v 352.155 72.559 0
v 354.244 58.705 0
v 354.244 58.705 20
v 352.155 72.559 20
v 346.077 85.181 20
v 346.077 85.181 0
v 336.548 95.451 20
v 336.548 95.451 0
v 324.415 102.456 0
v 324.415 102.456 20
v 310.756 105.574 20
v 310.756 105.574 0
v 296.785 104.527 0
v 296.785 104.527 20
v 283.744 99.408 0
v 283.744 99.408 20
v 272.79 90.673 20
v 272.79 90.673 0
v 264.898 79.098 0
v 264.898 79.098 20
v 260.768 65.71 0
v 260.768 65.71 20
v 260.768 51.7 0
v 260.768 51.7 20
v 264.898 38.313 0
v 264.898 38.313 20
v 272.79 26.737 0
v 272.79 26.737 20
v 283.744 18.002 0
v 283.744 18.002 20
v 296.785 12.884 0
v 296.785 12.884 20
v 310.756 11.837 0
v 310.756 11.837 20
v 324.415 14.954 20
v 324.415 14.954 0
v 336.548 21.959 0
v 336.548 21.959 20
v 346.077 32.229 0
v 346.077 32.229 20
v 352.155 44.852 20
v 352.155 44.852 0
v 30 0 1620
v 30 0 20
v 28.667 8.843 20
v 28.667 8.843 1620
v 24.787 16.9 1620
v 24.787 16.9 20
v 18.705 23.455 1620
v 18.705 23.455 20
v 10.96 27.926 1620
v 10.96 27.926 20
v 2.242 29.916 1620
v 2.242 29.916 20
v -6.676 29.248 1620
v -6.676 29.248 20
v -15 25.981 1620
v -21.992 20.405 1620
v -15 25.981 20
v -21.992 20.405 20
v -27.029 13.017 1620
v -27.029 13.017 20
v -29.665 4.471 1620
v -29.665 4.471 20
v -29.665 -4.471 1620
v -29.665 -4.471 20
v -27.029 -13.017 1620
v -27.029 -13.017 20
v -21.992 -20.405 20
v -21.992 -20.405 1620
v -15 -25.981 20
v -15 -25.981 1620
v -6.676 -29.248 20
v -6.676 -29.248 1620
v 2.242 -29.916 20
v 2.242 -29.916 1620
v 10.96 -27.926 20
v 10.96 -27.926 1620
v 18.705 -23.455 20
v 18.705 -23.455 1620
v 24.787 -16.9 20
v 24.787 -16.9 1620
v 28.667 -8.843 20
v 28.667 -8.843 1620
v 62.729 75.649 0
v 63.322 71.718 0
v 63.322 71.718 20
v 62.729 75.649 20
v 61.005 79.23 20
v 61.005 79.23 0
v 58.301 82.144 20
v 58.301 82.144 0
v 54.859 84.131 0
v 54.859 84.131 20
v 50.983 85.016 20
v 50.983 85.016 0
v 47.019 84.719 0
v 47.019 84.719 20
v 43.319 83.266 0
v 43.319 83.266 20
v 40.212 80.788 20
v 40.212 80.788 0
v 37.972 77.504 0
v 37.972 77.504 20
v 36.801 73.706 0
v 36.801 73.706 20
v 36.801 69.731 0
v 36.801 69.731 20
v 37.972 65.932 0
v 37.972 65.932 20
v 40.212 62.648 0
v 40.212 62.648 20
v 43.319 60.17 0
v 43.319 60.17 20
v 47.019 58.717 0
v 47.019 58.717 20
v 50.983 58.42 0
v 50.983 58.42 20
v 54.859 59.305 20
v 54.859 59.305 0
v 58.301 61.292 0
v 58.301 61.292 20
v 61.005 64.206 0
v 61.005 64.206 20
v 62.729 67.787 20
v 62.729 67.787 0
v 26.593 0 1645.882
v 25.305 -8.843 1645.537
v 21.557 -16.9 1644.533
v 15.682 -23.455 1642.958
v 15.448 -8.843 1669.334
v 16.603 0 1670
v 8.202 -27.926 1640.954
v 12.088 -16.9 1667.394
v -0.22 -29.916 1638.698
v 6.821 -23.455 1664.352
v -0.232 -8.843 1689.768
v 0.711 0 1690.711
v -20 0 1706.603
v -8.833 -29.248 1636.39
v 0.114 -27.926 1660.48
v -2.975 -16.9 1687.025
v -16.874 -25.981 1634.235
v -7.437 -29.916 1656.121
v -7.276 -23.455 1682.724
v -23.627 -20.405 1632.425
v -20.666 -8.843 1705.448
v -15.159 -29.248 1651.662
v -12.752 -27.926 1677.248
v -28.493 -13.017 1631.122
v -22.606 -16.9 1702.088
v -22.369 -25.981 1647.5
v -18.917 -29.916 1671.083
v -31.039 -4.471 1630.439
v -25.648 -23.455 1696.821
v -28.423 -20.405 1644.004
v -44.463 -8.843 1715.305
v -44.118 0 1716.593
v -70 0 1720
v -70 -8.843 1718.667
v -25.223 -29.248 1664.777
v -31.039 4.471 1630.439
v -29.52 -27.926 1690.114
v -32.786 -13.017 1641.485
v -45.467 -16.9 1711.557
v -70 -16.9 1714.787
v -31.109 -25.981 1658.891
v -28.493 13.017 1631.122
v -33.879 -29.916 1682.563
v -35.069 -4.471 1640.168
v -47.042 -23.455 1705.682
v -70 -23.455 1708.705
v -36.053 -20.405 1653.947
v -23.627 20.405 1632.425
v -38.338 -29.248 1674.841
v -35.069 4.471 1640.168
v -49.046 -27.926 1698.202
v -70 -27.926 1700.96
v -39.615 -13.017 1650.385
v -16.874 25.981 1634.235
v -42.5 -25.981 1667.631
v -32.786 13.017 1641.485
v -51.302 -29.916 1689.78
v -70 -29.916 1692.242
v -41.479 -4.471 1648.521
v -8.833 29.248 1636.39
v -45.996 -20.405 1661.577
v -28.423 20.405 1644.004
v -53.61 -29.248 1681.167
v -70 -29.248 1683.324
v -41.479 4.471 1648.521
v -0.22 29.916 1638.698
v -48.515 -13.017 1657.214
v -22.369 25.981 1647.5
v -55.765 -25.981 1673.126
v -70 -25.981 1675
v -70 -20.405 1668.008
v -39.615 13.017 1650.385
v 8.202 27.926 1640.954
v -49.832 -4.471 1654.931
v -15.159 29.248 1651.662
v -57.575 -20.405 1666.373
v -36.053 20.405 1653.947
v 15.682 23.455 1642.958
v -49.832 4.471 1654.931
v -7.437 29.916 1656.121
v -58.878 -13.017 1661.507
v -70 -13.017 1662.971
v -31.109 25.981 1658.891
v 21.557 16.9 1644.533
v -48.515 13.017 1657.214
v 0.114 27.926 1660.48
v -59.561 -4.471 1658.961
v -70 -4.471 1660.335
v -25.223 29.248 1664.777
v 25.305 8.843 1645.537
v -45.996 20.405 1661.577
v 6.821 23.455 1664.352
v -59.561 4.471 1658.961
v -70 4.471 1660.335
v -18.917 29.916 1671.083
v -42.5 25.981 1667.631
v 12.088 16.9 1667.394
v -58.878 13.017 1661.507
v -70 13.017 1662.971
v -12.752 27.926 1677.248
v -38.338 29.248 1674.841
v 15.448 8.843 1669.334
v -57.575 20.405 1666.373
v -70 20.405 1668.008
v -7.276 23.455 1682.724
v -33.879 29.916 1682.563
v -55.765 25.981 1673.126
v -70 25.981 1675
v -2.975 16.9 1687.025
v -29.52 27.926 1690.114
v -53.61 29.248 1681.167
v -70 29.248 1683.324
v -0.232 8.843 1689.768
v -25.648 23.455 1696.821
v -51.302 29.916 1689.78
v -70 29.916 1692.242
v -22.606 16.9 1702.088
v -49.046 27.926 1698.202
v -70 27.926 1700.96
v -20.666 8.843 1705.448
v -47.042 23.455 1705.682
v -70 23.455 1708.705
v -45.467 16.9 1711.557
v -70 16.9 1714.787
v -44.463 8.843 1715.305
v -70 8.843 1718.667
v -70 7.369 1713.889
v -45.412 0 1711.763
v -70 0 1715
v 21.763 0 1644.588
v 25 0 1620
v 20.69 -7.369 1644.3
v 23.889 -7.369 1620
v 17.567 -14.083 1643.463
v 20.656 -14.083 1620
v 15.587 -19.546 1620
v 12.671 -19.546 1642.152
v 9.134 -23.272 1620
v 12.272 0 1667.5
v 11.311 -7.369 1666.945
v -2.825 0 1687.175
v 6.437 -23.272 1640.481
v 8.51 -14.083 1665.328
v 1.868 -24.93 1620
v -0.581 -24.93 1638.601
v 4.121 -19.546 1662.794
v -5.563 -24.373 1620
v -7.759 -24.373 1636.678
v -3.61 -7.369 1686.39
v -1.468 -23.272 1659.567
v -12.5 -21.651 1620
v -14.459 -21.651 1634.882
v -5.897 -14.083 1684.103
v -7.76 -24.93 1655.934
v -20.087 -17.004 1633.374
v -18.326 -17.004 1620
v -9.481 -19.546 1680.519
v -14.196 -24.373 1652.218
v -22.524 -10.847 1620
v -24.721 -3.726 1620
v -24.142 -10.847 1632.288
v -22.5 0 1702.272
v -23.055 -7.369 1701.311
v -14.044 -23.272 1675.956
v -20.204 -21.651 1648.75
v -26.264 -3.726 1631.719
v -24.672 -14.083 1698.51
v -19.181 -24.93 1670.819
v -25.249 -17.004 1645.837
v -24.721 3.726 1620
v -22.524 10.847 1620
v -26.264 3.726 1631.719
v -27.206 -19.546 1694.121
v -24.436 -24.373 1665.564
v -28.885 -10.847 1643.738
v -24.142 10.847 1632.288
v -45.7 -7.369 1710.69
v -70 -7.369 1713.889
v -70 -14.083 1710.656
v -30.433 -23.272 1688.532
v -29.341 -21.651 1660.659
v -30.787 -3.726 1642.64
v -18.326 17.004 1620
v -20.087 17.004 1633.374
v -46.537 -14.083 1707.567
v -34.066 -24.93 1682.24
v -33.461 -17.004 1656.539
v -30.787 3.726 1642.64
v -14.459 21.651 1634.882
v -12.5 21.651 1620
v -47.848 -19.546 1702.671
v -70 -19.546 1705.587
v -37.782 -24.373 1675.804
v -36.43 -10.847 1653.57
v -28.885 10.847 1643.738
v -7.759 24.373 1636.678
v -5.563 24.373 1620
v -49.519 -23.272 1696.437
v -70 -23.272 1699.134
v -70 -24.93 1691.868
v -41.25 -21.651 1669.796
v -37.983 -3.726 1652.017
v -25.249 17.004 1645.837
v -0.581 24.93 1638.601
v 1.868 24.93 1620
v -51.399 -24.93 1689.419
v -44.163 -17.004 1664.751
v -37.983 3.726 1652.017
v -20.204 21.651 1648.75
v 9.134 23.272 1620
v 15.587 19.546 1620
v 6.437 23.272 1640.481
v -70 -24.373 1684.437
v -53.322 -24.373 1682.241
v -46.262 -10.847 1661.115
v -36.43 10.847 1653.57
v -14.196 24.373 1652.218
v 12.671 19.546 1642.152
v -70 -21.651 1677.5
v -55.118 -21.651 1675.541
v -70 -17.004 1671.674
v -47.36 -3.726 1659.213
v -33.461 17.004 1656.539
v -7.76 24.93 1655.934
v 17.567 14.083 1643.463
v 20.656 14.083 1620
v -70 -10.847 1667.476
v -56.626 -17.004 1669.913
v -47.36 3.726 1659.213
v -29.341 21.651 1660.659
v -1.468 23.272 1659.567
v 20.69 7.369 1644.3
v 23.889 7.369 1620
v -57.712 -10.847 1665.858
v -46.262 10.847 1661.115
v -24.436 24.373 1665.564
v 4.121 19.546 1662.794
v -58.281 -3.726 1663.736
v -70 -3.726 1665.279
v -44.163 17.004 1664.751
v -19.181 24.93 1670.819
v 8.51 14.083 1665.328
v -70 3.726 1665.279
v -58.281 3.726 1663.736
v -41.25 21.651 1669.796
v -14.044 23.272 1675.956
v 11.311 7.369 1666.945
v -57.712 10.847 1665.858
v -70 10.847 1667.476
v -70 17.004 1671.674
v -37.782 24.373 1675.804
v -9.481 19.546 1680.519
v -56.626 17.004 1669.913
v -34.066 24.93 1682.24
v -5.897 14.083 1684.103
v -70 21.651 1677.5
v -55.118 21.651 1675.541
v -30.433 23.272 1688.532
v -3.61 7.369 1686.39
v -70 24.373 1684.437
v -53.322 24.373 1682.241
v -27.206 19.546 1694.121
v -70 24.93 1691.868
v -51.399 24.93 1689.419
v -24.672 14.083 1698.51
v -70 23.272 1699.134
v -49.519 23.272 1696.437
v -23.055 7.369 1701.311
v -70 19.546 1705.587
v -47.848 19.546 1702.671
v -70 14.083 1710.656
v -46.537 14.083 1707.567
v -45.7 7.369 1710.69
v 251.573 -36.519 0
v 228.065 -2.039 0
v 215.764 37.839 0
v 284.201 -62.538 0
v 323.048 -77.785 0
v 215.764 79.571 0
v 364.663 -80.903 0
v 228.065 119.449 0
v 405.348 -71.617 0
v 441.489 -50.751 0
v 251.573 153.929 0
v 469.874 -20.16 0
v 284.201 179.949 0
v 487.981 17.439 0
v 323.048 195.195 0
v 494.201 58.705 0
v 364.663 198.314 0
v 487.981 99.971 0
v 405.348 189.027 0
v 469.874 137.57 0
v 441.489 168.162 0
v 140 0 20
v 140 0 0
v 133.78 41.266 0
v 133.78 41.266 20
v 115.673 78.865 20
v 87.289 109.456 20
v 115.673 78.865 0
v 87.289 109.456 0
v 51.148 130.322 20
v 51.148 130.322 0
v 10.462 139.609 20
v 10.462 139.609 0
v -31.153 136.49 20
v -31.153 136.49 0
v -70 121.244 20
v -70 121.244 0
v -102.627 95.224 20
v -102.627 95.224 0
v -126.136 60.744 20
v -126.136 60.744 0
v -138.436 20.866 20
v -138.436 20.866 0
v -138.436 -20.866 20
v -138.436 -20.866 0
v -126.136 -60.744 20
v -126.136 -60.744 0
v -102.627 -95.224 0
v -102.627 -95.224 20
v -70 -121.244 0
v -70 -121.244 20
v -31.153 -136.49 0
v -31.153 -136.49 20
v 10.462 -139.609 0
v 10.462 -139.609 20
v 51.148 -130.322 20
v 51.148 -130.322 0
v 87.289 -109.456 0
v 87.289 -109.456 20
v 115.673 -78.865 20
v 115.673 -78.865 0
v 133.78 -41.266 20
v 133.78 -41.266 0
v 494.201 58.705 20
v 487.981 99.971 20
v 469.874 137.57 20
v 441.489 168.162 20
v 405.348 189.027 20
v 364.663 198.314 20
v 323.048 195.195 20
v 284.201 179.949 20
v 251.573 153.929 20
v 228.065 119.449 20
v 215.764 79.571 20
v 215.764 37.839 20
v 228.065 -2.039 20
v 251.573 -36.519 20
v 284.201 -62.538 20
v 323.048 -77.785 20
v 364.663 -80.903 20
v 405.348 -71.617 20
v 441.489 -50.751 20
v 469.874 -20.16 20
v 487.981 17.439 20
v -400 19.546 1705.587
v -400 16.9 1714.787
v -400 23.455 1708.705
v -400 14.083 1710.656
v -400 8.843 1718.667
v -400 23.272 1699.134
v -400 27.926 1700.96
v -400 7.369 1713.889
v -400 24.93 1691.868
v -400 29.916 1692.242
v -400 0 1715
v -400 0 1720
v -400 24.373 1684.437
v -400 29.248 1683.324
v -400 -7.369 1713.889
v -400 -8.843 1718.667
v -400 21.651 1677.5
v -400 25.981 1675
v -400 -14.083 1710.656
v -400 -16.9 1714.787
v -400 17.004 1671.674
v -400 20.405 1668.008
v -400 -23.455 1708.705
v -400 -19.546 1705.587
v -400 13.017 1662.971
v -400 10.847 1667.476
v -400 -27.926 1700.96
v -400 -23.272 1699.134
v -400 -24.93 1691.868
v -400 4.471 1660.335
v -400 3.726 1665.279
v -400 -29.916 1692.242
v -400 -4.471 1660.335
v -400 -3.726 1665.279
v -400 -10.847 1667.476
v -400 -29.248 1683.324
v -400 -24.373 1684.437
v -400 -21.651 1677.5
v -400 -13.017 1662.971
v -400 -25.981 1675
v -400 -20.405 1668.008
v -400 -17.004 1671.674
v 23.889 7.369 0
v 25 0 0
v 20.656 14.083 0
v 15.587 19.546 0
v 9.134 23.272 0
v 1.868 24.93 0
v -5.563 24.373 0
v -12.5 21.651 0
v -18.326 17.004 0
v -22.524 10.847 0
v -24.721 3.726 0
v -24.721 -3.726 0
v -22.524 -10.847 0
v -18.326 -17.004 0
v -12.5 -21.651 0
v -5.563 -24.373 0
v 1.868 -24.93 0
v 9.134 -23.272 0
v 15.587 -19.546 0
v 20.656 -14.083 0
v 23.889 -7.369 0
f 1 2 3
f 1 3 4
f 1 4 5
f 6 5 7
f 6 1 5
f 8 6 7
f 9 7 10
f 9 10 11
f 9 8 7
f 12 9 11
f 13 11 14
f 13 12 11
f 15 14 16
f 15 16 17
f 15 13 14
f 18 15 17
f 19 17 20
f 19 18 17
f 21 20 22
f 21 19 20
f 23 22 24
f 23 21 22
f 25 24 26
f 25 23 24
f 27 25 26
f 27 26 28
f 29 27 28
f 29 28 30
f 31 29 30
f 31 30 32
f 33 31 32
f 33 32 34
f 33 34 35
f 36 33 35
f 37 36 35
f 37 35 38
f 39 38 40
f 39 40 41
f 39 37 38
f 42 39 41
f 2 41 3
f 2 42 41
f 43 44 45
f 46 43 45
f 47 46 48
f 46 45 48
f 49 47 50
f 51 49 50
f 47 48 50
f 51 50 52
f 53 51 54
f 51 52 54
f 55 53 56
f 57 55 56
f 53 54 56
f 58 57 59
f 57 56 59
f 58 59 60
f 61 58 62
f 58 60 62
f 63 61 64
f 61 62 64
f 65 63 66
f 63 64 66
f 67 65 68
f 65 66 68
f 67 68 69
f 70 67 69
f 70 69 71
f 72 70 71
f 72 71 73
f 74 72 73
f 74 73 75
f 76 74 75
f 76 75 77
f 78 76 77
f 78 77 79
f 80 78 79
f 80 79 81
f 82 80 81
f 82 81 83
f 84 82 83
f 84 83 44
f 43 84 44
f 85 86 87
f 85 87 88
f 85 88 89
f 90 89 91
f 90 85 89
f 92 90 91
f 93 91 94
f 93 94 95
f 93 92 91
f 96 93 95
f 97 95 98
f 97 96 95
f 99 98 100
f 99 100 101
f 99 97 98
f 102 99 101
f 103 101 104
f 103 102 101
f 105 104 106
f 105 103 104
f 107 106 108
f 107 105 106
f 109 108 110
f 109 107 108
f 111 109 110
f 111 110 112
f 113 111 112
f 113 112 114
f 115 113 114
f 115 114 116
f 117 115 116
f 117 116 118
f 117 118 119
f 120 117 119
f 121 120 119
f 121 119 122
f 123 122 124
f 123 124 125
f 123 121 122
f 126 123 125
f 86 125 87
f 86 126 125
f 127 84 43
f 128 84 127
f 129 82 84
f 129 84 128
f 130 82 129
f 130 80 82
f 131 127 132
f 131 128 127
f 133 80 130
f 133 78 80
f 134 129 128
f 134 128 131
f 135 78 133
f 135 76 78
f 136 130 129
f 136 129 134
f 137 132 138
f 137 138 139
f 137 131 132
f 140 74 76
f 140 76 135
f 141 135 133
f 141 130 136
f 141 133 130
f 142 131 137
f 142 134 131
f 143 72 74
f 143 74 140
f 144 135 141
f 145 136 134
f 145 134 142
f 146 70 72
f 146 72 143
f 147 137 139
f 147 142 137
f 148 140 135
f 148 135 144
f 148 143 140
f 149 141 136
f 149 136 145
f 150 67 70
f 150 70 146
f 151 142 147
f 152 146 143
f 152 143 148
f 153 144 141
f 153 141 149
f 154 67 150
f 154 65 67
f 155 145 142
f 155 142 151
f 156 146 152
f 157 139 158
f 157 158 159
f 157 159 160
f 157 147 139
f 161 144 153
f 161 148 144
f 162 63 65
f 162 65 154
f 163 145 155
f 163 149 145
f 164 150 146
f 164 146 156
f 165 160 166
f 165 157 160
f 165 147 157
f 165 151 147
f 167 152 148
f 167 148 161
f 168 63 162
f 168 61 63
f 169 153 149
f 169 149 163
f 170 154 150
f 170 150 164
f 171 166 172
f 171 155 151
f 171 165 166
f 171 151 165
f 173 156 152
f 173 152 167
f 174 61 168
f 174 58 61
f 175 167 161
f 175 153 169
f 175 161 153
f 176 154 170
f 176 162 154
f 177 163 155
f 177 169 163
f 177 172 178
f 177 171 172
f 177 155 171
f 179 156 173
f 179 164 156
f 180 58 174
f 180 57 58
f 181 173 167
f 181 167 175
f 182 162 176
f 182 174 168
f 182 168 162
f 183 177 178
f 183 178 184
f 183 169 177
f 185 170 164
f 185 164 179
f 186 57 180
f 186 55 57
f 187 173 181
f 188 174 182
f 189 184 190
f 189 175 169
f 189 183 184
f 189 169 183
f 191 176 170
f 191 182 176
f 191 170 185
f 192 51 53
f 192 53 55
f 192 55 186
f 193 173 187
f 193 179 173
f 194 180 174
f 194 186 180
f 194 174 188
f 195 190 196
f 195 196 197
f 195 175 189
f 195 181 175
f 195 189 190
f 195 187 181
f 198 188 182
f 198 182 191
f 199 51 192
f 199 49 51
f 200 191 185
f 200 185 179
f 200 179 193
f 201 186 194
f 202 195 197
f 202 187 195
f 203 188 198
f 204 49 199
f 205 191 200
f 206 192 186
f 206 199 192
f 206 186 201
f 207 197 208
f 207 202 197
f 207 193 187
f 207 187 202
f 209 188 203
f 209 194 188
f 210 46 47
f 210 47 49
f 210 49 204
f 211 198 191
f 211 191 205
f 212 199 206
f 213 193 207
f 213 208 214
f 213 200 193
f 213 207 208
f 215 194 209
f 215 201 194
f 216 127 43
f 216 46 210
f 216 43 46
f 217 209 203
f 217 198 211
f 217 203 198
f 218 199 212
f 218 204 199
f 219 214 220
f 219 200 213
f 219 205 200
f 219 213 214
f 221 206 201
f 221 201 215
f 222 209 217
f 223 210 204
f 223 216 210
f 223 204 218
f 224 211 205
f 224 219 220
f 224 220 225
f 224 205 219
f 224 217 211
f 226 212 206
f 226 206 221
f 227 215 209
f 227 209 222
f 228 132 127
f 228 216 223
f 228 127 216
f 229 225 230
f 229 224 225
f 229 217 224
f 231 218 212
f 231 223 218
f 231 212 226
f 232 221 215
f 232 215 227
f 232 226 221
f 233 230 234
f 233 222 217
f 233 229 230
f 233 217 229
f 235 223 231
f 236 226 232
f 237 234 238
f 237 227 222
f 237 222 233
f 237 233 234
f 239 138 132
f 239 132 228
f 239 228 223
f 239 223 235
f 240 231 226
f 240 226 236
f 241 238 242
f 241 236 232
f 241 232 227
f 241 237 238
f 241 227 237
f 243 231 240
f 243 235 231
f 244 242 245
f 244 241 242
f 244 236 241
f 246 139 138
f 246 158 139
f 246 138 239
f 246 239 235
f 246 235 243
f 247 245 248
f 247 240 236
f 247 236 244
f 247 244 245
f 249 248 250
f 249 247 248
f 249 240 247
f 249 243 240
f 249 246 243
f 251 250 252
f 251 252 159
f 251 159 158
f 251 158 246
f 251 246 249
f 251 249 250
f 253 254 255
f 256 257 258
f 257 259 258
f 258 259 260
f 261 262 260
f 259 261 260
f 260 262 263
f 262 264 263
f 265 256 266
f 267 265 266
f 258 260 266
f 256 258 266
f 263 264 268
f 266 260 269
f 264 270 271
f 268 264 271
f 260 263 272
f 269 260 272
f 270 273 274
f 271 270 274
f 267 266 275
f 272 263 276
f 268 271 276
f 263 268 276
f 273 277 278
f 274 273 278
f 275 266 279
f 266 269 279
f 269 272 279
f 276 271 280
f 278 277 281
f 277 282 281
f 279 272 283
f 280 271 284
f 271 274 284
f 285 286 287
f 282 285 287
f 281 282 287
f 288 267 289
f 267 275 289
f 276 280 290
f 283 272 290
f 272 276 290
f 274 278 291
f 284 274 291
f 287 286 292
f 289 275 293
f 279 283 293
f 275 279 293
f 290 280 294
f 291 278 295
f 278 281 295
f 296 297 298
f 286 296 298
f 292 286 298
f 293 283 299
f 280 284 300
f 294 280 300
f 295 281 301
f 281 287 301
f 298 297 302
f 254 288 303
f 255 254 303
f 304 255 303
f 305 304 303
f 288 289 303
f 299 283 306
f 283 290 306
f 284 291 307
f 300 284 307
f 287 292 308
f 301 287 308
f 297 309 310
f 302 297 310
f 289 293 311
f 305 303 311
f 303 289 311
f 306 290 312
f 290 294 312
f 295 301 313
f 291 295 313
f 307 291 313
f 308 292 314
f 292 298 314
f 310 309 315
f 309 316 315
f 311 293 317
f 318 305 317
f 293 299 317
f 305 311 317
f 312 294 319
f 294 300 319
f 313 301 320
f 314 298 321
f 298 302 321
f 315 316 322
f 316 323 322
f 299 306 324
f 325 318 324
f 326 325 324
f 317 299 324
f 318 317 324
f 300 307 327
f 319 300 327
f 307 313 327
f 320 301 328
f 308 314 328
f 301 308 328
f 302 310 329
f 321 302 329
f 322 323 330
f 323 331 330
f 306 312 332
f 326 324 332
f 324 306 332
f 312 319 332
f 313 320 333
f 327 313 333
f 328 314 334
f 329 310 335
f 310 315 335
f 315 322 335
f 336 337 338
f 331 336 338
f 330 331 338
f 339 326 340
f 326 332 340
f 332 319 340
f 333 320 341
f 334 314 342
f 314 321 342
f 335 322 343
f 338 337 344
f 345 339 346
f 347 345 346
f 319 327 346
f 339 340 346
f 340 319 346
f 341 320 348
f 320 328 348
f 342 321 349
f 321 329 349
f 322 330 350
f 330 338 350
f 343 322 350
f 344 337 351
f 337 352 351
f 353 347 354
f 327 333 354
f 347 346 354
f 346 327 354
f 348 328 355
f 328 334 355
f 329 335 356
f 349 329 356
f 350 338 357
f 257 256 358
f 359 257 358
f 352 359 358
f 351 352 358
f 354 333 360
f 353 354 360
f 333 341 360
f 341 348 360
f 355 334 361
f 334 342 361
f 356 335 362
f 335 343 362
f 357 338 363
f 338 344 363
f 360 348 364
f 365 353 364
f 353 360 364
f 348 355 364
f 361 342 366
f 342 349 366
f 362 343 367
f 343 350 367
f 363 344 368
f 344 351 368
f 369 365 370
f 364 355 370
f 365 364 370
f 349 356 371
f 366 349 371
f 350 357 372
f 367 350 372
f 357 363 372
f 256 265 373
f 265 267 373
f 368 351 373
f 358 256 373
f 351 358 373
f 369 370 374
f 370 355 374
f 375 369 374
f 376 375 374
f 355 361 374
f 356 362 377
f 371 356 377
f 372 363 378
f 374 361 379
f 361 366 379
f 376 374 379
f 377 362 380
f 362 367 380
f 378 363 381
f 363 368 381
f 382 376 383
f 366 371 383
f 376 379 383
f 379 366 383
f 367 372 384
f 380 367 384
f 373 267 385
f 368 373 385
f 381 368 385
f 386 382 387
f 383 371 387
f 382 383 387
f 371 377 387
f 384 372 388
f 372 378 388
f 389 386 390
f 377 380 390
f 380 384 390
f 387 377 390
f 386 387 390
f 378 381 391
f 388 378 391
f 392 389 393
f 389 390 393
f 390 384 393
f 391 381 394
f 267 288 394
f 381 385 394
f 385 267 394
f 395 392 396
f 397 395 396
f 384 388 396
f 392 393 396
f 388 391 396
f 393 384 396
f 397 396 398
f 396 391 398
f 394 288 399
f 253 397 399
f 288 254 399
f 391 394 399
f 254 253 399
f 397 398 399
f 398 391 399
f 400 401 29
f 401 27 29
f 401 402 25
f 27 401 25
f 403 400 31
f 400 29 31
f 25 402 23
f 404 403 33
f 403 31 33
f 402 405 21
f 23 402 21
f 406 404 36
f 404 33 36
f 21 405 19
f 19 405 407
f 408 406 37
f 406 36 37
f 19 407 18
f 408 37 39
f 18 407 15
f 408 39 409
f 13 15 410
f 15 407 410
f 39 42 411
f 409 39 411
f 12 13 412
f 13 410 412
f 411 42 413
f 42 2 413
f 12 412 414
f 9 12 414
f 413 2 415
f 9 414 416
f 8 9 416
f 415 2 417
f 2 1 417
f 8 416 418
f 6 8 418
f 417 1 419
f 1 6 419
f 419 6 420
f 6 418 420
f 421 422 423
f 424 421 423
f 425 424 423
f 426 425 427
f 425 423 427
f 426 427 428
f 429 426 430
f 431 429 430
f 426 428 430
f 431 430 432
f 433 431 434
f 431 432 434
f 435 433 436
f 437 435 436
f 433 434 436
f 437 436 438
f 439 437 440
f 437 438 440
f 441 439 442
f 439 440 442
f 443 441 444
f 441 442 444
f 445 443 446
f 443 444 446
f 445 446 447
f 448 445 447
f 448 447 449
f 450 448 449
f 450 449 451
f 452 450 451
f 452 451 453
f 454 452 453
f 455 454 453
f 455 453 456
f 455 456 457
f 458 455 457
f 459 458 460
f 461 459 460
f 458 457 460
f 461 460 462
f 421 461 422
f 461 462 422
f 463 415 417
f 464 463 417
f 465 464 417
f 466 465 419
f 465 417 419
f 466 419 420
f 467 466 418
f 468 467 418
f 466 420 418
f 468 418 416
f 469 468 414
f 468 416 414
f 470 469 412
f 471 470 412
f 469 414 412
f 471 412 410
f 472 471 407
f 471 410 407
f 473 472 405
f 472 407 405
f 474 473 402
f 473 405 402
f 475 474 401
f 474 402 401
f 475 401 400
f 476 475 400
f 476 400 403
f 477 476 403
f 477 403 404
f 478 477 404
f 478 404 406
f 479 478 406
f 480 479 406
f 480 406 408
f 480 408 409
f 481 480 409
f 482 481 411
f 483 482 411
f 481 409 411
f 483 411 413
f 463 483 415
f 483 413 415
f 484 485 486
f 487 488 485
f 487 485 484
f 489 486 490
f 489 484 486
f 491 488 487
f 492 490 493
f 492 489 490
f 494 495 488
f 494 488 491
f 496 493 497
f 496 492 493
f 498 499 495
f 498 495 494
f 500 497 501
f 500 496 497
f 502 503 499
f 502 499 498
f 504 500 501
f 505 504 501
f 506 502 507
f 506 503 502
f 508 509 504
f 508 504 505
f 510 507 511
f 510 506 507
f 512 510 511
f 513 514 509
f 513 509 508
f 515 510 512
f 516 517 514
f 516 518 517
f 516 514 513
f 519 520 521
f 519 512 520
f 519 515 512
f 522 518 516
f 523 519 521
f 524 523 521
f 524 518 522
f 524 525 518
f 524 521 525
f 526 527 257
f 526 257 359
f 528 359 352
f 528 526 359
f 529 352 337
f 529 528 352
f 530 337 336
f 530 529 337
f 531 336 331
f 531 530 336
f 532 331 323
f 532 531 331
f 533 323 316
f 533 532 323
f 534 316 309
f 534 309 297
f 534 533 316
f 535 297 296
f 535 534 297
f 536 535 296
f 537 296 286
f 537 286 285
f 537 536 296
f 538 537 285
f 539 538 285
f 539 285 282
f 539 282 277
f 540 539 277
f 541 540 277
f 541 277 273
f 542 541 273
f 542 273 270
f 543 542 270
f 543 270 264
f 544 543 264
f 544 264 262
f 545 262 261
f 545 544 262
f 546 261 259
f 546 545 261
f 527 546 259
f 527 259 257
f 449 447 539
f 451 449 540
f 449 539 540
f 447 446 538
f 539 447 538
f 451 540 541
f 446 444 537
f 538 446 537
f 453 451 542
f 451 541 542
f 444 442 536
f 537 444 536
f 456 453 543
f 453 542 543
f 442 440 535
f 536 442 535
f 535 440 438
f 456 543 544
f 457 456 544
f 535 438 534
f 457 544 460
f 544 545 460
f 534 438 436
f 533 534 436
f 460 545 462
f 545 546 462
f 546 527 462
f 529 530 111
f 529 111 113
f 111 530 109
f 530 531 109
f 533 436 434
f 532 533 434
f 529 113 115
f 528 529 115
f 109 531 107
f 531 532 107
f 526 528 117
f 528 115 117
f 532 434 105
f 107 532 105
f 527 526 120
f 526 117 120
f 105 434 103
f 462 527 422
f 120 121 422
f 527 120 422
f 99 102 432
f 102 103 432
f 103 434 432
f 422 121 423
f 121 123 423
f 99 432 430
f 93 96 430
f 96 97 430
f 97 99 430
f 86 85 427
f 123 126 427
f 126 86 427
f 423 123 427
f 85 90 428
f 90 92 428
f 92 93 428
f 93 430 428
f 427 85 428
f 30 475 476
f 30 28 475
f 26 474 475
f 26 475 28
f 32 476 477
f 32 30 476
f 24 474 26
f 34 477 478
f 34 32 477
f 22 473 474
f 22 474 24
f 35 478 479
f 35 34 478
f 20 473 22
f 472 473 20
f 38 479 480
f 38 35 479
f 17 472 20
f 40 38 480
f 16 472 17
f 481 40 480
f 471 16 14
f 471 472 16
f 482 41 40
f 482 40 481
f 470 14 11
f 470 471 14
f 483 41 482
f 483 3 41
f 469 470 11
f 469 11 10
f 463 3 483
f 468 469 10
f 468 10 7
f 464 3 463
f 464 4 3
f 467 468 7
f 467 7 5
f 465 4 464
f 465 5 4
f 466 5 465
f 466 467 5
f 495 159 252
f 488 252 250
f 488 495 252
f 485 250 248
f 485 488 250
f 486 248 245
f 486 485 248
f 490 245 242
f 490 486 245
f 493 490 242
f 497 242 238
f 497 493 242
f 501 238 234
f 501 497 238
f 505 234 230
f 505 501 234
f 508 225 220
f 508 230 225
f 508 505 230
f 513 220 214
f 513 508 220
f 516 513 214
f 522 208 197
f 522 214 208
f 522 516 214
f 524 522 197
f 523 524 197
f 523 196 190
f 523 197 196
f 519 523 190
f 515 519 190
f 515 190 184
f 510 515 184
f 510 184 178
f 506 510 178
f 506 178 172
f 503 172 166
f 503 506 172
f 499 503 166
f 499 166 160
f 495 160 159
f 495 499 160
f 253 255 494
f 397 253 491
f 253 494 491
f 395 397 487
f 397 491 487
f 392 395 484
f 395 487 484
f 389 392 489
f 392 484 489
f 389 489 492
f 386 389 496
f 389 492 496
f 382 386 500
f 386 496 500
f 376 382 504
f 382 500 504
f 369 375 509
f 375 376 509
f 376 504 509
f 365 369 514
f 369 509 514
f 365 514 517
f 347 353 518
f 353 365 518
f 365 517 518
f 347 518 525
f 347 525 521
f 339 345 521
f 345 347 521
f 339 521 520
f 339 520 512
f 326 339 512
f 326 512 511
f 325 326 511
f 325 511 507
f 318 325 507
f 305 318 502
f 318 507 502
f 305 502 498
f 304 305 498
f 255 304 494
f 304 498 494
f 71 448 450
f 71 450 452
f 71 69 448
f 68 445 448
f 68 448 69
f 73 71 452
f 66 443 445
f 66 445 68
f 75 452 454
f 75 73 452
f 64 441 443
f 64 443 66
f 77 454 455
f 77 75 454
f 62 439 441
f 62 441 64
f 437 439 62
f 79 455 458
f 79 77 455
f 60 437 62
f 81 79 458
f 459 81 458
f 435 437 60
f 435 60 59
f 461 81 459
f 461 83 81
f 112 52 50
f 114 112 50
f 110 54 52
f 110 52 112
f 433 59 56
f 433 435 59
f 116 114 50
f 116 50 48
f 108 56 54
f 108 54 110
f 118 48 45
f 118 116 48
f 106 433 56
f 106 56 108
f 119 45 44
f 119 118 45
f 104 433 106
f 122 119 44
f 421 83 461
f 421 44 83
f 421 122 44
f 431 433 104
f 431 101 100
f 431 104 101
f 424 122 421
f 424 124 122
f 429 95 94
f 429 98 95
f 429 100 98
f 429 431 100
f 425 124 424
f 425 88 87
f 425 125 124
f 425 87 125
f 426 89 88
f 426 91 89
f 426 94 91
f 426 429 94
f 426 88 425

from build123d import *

# Parameters (mm, degrees)
F0_R        = 140
F0_R_2      = 30
F0_R_3      = 13.335
F1_DEPTH    = 20
F0_R_4      = 25
F2_DEPTH    = 1620
F2_FACE_R   = 30
F2_FACE_R_2 = 25
F0_R_5      = 47
F8_DEPTH    = 20


with BuildPart() as f1:
    # F0 (on Top) → F1 (new body)
    with BuildSketch(Plane.XY):
        Circle(F0_R)
        Circle(F0_R_2, mode=Mode.SUBTRACT)
        with Locations((49.9867759645, 71.7180371284)):
            Circle(F0_R_3, mode=Mode.SUBTRACT)
    extrude(amount=F1_DEPTH)

    # F0 (on Top) → F2 (join)
    with BuildSketch(Plane.XY):
        Circle(F0_R_2)
        Circle(F0_R_4, mode=Mode.SUBTRACT)
    extrude(amount=F2_DEPTH)

    # F7: sweep along a path in F6
    with BuildLine(Plane.XZ) as f7_path:
        ThreePointArc((0, 1620), (-20.5025253169, 1669.4974746831), (-70, 1690))
        Line((-70, 1690), (-400, 1690))
    # F2_face (on face) → F7 (sweep)
    with BuildSketch(Plane.XY.offset(1620)):
        Circle(F2_FACE_R)
        Circle(F2_FACE_R_2, mode=Mode.SUBTRACT)
    sweep(path=f7_path.line)


with BuildPart() as f8:
    # F0 (on Top) → F8 (new body)
    with BuildSketch(Plane.XY):
        with Locations((354.2005717754, 58.7051436305)):
            Circle(F0_R)
        with Locations((307.2435322225, 58.7051436305)):
            Circle(F0_R_5, mode=Mode.SUBTRACT)
    extrude(amount=F8_DEPTH)


solid = Compound([f1.part, f8.part])
